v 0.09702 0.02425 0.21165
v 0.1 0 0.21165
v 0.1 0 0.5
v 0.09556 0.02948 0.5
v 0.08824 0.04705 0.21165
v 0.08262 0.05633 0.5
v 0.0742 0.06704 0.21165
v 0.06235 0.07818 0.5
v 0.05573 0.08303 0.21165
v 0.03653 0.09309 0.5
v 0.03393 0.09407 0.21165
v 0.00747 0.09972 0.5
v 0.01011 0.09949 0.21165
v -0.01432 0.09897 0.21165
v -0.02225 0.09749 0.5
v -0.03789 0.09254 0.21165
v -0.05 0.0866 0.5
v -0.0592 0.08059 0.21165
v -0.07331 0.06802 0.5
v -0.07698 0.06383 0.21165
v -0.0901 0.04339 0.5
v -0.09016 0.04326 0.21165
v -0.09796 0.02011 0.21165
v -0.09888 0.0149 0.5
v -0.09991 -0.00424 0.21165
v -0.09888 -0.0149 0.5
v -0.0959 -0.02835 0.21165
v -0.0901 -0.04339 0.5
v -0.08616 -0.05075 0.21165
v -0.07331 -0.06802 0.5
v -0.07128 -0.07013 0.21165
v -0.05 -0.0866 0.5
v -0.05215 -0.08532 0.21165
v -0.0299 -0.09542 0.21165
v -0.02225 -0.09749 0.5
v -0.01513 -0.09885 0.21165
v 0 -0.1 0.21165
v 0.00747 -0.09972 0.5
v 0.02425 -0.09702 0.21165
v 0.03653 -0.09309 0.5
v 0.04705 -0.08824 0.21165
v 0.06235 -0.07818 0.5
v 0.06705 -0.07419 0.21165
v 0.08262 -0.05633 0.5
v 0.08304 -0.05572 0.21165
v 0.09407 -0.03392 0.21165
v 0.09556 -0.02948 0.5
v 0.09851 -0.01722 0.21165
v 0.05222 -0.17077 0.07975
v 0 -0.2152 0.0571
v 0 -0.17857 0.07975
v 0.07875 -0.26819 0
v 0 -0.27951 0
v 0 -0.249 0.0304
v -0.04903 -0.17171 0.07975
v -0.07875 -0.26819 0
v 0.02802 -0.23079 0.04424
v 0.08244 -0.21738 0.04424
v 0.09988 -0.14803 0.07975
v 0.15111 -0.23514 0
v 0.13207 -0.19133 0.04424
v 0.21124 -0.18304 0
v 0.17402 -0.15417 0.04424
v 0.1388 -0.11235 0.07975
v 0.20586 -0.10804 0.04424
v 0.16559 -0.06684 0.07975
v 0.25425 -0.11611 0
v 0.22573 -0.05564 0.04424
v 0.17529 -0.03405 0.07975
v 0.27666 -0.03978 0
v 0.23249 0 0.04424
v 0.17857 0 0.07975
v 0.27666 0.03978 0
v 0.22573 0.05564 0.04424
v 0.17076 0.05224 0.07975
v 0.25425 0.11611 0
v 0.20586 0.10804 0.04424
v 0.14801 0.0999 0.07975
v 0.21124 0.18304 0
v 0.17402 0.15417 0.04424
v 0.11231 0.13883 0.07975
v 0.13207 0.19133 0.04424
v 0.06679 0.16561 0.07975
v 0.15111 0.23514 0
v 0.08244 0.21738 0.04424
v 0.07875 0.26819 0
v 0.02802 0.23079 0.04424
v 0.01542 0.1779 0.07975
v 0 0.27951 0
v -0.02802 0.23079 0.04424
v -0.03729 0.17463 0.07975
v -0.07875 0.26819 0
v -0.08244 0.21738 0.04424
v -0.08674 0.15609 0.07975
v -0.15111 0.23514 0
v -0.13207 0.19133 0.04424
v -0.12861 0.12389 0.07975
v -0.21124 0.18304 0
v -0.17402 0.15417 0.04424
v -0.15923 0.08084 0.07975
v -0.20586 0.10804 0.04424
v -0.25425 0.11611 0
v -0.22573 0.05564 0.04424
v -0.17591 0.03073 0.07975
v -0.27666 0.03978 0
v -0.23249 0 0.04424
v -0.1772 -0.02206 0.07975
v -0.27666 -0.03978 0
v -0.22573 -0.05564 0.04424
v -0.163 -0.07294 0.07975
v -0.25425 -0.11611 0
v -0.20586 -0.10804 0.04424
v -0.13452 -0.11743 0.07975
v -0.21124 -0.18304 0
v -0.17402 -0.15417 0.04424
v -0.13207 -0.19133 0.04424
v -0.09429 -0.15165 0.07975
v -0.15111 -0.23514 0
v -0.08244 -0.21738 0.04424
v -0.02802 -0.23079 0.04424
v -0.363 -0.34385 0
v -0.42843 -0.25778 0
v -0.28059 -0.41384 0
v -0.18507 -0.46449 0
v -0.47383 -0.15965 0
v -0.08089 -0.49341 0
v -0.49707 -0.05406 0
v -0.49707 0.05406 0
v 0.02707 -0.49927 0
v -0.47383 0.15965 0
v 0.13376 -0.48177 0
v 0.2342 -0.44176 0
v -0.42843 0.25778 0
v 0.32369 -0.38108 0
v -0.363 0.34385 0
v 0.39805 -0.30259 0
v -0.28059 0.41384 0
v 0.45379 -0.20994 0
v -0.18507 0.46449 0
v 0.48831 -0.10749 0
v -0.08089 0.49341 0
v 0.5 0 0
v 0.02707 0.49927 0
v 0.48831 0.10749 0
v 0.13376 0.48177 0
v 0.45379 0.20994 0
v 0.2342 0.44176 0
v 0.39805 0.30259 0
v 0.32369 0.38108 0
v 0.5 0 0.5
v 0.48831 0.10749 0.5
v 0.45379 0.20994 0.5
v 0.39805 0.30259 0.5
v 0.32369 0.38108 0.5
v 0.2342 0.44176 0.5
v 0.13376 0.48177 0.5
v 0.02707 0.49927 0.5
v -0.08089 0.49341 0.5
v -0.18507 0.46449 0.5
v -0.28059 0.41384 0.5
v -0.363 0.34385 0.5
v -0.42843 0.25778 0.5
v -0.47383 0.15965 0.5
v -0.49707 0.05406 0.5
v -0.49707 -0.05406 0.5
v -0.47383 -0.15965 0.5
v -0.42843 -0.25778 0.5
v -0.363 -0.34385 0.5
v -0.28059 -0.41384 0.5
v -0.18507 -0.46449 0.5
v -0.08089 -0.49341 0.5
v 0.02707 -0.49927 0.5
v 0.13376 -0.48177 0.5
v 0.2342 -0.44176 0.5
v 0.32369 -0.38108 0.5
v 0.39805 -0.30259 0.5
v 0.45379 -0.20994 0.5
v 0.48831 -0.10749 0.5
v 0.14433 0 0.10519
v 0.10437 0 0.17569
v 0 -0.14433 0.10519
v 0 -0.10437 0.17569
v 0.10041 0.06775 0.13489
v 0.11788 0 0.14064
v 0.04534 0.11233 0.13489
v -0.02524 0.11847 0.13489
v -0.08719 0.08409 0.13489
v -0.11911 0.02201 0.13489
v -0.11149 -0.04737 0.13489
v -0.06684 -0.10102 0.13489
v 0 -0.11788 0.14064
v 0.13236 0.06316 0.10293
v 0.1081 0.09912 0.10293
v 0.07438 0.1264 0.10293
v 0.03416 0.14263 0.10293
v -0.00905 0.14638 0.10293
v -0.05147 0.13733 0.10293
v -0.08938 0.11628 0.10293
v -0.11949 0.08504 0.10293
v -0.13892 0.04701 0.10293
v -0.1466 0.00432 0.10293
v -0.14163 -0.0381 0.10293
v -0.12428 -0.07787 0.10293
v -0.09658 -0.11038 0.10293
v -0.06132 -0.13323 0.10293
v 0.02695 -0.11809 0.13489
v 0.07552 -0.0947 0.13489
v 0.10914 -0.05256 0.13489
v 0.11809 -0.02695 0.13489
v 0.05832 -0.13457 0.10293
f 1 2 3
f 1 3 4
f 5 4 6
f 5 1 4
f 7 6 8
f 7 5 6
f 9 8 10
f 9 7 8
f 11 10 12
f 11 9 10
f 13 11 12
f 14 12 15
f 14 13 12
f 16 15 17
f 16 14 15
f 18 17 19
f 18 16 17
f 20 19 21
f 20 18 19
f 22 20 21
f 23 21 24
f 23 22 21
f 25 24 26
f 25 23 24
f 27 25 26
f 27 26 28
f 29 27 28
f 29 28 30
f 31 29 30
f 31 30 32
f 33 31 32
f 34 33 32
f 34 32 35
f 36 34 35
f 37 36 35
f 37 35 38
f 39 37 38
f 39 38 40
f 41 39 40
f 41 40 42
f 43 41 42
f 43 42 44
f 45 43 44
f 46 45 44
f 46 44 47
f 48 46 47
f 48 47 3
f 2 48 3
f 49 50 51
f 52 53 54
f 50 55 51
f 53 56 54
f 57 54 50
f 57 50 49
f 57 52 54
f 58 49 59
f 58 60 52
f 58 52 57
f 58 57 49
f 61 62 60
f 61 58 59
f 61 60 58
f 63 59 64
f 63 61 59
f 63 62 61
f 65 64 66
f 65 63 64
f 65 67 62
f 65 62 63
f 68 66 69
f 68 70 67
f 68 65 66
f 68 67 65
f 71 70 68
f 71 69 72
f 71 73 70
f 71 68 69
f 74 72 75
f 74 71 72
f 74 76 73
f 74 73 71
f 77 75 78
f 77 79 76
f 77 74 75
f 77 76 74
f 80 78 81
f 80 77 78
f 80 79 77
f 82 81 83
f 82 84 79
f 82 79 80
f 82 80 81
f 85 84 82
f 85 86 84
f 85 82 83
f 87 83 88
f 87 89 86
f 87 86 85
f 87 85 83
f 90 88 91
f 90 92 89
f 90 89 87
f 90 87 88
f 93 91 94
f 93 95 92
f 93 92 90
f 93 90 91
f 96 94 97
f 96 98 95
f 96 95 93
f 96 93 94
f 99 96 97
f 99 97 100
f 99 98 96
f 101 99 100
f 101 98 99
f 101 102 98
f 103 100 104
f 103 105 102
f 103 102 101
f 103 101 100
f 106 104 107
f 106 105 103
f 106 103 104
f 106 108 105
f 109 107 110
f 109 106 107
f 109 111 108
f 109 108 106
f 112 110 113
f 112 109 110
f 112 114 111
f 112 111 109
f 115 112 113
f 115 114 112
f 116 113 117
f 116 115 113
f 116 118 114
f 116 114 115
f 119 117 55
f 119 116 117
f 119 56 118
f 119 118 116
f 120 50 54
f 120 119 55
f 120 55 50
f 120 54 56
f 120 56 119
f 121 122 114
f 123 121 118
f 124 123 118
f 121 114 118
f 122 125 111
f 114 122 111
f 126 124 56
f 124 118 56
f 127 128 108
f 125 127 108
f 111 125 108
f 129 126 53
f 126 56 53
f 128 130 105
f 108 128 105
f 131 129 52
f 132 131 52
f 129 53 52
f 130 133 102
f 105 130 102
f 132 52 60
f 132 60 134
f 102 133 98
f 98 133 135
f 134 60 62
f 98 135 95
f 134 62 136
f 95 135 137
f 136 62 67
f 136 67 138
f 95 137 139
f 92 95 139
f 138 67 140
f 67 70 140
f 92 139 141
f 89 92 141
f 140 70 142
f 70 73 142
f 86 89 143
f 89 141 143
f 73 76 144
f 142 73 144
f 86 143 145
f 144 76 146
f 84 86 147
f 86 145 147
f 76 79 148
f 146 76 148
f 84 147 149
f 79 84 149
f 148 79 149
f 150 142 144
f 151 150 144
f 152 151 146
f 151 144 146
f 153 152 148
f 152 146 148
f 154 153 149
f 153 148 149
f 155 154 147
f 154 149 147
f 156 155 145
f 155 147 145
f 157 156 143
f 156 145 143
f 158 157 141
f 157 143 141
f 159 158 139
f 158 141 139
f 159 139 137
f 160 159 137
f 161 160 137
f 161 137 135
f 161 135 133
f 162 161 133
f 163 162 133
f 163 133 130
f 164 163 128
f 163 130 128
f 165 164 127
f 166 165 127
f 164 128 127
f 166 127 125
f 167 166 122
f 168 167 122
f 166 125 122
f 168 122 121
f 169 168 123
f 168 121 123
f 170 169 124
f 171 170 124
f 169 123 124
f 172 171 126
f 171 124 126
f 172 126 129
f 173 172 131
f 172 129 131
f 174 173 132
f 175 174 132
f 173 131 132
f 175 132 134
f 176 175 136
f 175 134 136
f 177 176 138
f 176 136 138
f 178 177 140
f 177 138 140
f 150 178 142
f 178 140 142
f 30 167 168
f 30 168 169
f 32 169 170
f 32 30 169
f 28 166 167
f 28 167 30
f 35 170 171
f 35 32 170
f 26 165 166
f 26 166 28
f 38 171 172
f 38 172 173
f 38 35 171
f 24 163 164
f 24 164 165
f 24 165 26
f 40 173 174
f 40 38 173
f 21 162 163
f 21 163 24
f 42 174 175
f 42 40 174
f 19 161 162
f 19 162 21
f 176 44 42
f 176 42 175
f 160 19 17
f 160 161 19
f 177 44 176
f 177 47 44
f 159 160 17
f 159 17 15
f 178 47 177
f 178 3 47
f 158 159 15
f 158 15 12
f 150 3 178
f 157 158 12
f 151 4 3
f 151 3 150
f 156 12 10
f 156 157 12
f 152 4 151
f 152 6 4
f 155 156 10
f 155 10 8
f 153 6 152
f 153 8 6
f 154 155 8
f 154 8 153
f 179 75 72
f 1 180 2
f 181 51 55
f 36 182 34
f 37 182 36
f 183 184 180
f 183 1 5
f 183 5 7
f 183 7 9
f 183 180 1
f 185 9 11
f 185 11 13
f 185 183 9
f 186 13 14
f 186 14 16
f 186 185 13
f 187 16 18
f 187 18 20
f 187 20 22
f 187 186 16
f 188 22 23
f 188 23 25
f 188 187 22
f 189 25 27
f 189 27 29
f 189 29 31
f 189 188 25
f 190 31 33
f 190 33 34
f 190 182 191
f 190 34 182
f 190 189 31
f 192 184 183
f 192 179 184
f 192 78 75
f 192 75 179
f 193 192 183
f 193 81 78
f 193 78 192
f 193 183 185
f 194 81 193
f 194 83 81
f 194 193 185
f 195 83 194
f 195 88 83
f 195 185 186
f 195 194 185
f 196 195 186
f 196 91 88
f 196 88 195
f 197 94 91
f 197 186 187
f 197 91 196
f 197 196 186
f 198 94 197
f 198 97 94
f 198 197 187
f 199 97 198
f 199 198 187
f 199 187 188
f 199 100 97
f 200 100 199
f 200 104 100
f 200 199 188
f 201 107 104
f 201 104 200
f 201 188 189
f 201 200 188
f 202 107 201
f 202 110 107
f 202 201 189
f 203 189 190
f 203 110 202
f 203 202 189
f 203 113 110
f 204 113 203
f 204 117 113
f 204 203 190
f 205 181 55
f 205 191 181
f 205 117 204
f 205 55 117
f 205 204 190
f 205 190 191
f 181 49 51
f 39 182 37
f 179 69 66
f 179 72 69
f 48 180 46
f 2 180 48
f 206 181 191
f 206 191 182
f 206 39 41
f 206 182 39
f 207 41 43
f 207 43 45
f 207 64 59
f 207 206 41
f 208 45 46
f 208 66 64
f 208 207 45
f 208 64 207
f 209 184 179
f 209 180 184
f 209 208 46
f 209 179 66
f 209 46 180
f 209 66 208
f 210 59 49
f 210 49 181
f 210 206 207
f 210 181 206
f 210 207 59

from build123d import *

# Parameters (mm, degrees)
CROQUIS1_R              = 0.5
CROQUIS1_R_2            = 0.1
SALIENTE_EXTRUIR1_DEPTH = 0.5
REDONDEO1_R             = 0.15


with BuildPart() as part:
    # Croquis1 → Saliente-Extruir1 (new body)
    with BuildSketch(Plane.XY):
        Circle(CROQUIS1_R)
        Circle(CROQUIS1_R_2, mode=Mode.SUBTRACT)
    extrude(amount=SALIENTE_EXTRUIR1_DEPTH)

    # Croquis2 → Cortar-Revolución1 (revolve, cut)
    with BuildSketch(Plane(origin=(0, 0, 0), x_dir=(0, 0, -1), z_dir=(1, 0, 0))):
        with BuildLine():
            Line((0, 0), (-0.125, 0))
            ThreePointArc((-0.125, 0), (-0.092326598, -0.153093109), (0, -0.279508497))
            Line((0, -0.279508497), (0, 0))
        make_face()
    revolve(axis=Axis((0, 0, 0), (0, 0, 1)), mode=Mode.SUBTRACT)

    # Redondeo1
    redondeo1_edges = [part.edges().sort_by_distance(p)[0] for p in [
        (-0.070710678, 0.070710678, 0.111420807),
    ]]
    fillet(redondeo1_edges, radius=REDONDEO1_R)


solid = part.part
